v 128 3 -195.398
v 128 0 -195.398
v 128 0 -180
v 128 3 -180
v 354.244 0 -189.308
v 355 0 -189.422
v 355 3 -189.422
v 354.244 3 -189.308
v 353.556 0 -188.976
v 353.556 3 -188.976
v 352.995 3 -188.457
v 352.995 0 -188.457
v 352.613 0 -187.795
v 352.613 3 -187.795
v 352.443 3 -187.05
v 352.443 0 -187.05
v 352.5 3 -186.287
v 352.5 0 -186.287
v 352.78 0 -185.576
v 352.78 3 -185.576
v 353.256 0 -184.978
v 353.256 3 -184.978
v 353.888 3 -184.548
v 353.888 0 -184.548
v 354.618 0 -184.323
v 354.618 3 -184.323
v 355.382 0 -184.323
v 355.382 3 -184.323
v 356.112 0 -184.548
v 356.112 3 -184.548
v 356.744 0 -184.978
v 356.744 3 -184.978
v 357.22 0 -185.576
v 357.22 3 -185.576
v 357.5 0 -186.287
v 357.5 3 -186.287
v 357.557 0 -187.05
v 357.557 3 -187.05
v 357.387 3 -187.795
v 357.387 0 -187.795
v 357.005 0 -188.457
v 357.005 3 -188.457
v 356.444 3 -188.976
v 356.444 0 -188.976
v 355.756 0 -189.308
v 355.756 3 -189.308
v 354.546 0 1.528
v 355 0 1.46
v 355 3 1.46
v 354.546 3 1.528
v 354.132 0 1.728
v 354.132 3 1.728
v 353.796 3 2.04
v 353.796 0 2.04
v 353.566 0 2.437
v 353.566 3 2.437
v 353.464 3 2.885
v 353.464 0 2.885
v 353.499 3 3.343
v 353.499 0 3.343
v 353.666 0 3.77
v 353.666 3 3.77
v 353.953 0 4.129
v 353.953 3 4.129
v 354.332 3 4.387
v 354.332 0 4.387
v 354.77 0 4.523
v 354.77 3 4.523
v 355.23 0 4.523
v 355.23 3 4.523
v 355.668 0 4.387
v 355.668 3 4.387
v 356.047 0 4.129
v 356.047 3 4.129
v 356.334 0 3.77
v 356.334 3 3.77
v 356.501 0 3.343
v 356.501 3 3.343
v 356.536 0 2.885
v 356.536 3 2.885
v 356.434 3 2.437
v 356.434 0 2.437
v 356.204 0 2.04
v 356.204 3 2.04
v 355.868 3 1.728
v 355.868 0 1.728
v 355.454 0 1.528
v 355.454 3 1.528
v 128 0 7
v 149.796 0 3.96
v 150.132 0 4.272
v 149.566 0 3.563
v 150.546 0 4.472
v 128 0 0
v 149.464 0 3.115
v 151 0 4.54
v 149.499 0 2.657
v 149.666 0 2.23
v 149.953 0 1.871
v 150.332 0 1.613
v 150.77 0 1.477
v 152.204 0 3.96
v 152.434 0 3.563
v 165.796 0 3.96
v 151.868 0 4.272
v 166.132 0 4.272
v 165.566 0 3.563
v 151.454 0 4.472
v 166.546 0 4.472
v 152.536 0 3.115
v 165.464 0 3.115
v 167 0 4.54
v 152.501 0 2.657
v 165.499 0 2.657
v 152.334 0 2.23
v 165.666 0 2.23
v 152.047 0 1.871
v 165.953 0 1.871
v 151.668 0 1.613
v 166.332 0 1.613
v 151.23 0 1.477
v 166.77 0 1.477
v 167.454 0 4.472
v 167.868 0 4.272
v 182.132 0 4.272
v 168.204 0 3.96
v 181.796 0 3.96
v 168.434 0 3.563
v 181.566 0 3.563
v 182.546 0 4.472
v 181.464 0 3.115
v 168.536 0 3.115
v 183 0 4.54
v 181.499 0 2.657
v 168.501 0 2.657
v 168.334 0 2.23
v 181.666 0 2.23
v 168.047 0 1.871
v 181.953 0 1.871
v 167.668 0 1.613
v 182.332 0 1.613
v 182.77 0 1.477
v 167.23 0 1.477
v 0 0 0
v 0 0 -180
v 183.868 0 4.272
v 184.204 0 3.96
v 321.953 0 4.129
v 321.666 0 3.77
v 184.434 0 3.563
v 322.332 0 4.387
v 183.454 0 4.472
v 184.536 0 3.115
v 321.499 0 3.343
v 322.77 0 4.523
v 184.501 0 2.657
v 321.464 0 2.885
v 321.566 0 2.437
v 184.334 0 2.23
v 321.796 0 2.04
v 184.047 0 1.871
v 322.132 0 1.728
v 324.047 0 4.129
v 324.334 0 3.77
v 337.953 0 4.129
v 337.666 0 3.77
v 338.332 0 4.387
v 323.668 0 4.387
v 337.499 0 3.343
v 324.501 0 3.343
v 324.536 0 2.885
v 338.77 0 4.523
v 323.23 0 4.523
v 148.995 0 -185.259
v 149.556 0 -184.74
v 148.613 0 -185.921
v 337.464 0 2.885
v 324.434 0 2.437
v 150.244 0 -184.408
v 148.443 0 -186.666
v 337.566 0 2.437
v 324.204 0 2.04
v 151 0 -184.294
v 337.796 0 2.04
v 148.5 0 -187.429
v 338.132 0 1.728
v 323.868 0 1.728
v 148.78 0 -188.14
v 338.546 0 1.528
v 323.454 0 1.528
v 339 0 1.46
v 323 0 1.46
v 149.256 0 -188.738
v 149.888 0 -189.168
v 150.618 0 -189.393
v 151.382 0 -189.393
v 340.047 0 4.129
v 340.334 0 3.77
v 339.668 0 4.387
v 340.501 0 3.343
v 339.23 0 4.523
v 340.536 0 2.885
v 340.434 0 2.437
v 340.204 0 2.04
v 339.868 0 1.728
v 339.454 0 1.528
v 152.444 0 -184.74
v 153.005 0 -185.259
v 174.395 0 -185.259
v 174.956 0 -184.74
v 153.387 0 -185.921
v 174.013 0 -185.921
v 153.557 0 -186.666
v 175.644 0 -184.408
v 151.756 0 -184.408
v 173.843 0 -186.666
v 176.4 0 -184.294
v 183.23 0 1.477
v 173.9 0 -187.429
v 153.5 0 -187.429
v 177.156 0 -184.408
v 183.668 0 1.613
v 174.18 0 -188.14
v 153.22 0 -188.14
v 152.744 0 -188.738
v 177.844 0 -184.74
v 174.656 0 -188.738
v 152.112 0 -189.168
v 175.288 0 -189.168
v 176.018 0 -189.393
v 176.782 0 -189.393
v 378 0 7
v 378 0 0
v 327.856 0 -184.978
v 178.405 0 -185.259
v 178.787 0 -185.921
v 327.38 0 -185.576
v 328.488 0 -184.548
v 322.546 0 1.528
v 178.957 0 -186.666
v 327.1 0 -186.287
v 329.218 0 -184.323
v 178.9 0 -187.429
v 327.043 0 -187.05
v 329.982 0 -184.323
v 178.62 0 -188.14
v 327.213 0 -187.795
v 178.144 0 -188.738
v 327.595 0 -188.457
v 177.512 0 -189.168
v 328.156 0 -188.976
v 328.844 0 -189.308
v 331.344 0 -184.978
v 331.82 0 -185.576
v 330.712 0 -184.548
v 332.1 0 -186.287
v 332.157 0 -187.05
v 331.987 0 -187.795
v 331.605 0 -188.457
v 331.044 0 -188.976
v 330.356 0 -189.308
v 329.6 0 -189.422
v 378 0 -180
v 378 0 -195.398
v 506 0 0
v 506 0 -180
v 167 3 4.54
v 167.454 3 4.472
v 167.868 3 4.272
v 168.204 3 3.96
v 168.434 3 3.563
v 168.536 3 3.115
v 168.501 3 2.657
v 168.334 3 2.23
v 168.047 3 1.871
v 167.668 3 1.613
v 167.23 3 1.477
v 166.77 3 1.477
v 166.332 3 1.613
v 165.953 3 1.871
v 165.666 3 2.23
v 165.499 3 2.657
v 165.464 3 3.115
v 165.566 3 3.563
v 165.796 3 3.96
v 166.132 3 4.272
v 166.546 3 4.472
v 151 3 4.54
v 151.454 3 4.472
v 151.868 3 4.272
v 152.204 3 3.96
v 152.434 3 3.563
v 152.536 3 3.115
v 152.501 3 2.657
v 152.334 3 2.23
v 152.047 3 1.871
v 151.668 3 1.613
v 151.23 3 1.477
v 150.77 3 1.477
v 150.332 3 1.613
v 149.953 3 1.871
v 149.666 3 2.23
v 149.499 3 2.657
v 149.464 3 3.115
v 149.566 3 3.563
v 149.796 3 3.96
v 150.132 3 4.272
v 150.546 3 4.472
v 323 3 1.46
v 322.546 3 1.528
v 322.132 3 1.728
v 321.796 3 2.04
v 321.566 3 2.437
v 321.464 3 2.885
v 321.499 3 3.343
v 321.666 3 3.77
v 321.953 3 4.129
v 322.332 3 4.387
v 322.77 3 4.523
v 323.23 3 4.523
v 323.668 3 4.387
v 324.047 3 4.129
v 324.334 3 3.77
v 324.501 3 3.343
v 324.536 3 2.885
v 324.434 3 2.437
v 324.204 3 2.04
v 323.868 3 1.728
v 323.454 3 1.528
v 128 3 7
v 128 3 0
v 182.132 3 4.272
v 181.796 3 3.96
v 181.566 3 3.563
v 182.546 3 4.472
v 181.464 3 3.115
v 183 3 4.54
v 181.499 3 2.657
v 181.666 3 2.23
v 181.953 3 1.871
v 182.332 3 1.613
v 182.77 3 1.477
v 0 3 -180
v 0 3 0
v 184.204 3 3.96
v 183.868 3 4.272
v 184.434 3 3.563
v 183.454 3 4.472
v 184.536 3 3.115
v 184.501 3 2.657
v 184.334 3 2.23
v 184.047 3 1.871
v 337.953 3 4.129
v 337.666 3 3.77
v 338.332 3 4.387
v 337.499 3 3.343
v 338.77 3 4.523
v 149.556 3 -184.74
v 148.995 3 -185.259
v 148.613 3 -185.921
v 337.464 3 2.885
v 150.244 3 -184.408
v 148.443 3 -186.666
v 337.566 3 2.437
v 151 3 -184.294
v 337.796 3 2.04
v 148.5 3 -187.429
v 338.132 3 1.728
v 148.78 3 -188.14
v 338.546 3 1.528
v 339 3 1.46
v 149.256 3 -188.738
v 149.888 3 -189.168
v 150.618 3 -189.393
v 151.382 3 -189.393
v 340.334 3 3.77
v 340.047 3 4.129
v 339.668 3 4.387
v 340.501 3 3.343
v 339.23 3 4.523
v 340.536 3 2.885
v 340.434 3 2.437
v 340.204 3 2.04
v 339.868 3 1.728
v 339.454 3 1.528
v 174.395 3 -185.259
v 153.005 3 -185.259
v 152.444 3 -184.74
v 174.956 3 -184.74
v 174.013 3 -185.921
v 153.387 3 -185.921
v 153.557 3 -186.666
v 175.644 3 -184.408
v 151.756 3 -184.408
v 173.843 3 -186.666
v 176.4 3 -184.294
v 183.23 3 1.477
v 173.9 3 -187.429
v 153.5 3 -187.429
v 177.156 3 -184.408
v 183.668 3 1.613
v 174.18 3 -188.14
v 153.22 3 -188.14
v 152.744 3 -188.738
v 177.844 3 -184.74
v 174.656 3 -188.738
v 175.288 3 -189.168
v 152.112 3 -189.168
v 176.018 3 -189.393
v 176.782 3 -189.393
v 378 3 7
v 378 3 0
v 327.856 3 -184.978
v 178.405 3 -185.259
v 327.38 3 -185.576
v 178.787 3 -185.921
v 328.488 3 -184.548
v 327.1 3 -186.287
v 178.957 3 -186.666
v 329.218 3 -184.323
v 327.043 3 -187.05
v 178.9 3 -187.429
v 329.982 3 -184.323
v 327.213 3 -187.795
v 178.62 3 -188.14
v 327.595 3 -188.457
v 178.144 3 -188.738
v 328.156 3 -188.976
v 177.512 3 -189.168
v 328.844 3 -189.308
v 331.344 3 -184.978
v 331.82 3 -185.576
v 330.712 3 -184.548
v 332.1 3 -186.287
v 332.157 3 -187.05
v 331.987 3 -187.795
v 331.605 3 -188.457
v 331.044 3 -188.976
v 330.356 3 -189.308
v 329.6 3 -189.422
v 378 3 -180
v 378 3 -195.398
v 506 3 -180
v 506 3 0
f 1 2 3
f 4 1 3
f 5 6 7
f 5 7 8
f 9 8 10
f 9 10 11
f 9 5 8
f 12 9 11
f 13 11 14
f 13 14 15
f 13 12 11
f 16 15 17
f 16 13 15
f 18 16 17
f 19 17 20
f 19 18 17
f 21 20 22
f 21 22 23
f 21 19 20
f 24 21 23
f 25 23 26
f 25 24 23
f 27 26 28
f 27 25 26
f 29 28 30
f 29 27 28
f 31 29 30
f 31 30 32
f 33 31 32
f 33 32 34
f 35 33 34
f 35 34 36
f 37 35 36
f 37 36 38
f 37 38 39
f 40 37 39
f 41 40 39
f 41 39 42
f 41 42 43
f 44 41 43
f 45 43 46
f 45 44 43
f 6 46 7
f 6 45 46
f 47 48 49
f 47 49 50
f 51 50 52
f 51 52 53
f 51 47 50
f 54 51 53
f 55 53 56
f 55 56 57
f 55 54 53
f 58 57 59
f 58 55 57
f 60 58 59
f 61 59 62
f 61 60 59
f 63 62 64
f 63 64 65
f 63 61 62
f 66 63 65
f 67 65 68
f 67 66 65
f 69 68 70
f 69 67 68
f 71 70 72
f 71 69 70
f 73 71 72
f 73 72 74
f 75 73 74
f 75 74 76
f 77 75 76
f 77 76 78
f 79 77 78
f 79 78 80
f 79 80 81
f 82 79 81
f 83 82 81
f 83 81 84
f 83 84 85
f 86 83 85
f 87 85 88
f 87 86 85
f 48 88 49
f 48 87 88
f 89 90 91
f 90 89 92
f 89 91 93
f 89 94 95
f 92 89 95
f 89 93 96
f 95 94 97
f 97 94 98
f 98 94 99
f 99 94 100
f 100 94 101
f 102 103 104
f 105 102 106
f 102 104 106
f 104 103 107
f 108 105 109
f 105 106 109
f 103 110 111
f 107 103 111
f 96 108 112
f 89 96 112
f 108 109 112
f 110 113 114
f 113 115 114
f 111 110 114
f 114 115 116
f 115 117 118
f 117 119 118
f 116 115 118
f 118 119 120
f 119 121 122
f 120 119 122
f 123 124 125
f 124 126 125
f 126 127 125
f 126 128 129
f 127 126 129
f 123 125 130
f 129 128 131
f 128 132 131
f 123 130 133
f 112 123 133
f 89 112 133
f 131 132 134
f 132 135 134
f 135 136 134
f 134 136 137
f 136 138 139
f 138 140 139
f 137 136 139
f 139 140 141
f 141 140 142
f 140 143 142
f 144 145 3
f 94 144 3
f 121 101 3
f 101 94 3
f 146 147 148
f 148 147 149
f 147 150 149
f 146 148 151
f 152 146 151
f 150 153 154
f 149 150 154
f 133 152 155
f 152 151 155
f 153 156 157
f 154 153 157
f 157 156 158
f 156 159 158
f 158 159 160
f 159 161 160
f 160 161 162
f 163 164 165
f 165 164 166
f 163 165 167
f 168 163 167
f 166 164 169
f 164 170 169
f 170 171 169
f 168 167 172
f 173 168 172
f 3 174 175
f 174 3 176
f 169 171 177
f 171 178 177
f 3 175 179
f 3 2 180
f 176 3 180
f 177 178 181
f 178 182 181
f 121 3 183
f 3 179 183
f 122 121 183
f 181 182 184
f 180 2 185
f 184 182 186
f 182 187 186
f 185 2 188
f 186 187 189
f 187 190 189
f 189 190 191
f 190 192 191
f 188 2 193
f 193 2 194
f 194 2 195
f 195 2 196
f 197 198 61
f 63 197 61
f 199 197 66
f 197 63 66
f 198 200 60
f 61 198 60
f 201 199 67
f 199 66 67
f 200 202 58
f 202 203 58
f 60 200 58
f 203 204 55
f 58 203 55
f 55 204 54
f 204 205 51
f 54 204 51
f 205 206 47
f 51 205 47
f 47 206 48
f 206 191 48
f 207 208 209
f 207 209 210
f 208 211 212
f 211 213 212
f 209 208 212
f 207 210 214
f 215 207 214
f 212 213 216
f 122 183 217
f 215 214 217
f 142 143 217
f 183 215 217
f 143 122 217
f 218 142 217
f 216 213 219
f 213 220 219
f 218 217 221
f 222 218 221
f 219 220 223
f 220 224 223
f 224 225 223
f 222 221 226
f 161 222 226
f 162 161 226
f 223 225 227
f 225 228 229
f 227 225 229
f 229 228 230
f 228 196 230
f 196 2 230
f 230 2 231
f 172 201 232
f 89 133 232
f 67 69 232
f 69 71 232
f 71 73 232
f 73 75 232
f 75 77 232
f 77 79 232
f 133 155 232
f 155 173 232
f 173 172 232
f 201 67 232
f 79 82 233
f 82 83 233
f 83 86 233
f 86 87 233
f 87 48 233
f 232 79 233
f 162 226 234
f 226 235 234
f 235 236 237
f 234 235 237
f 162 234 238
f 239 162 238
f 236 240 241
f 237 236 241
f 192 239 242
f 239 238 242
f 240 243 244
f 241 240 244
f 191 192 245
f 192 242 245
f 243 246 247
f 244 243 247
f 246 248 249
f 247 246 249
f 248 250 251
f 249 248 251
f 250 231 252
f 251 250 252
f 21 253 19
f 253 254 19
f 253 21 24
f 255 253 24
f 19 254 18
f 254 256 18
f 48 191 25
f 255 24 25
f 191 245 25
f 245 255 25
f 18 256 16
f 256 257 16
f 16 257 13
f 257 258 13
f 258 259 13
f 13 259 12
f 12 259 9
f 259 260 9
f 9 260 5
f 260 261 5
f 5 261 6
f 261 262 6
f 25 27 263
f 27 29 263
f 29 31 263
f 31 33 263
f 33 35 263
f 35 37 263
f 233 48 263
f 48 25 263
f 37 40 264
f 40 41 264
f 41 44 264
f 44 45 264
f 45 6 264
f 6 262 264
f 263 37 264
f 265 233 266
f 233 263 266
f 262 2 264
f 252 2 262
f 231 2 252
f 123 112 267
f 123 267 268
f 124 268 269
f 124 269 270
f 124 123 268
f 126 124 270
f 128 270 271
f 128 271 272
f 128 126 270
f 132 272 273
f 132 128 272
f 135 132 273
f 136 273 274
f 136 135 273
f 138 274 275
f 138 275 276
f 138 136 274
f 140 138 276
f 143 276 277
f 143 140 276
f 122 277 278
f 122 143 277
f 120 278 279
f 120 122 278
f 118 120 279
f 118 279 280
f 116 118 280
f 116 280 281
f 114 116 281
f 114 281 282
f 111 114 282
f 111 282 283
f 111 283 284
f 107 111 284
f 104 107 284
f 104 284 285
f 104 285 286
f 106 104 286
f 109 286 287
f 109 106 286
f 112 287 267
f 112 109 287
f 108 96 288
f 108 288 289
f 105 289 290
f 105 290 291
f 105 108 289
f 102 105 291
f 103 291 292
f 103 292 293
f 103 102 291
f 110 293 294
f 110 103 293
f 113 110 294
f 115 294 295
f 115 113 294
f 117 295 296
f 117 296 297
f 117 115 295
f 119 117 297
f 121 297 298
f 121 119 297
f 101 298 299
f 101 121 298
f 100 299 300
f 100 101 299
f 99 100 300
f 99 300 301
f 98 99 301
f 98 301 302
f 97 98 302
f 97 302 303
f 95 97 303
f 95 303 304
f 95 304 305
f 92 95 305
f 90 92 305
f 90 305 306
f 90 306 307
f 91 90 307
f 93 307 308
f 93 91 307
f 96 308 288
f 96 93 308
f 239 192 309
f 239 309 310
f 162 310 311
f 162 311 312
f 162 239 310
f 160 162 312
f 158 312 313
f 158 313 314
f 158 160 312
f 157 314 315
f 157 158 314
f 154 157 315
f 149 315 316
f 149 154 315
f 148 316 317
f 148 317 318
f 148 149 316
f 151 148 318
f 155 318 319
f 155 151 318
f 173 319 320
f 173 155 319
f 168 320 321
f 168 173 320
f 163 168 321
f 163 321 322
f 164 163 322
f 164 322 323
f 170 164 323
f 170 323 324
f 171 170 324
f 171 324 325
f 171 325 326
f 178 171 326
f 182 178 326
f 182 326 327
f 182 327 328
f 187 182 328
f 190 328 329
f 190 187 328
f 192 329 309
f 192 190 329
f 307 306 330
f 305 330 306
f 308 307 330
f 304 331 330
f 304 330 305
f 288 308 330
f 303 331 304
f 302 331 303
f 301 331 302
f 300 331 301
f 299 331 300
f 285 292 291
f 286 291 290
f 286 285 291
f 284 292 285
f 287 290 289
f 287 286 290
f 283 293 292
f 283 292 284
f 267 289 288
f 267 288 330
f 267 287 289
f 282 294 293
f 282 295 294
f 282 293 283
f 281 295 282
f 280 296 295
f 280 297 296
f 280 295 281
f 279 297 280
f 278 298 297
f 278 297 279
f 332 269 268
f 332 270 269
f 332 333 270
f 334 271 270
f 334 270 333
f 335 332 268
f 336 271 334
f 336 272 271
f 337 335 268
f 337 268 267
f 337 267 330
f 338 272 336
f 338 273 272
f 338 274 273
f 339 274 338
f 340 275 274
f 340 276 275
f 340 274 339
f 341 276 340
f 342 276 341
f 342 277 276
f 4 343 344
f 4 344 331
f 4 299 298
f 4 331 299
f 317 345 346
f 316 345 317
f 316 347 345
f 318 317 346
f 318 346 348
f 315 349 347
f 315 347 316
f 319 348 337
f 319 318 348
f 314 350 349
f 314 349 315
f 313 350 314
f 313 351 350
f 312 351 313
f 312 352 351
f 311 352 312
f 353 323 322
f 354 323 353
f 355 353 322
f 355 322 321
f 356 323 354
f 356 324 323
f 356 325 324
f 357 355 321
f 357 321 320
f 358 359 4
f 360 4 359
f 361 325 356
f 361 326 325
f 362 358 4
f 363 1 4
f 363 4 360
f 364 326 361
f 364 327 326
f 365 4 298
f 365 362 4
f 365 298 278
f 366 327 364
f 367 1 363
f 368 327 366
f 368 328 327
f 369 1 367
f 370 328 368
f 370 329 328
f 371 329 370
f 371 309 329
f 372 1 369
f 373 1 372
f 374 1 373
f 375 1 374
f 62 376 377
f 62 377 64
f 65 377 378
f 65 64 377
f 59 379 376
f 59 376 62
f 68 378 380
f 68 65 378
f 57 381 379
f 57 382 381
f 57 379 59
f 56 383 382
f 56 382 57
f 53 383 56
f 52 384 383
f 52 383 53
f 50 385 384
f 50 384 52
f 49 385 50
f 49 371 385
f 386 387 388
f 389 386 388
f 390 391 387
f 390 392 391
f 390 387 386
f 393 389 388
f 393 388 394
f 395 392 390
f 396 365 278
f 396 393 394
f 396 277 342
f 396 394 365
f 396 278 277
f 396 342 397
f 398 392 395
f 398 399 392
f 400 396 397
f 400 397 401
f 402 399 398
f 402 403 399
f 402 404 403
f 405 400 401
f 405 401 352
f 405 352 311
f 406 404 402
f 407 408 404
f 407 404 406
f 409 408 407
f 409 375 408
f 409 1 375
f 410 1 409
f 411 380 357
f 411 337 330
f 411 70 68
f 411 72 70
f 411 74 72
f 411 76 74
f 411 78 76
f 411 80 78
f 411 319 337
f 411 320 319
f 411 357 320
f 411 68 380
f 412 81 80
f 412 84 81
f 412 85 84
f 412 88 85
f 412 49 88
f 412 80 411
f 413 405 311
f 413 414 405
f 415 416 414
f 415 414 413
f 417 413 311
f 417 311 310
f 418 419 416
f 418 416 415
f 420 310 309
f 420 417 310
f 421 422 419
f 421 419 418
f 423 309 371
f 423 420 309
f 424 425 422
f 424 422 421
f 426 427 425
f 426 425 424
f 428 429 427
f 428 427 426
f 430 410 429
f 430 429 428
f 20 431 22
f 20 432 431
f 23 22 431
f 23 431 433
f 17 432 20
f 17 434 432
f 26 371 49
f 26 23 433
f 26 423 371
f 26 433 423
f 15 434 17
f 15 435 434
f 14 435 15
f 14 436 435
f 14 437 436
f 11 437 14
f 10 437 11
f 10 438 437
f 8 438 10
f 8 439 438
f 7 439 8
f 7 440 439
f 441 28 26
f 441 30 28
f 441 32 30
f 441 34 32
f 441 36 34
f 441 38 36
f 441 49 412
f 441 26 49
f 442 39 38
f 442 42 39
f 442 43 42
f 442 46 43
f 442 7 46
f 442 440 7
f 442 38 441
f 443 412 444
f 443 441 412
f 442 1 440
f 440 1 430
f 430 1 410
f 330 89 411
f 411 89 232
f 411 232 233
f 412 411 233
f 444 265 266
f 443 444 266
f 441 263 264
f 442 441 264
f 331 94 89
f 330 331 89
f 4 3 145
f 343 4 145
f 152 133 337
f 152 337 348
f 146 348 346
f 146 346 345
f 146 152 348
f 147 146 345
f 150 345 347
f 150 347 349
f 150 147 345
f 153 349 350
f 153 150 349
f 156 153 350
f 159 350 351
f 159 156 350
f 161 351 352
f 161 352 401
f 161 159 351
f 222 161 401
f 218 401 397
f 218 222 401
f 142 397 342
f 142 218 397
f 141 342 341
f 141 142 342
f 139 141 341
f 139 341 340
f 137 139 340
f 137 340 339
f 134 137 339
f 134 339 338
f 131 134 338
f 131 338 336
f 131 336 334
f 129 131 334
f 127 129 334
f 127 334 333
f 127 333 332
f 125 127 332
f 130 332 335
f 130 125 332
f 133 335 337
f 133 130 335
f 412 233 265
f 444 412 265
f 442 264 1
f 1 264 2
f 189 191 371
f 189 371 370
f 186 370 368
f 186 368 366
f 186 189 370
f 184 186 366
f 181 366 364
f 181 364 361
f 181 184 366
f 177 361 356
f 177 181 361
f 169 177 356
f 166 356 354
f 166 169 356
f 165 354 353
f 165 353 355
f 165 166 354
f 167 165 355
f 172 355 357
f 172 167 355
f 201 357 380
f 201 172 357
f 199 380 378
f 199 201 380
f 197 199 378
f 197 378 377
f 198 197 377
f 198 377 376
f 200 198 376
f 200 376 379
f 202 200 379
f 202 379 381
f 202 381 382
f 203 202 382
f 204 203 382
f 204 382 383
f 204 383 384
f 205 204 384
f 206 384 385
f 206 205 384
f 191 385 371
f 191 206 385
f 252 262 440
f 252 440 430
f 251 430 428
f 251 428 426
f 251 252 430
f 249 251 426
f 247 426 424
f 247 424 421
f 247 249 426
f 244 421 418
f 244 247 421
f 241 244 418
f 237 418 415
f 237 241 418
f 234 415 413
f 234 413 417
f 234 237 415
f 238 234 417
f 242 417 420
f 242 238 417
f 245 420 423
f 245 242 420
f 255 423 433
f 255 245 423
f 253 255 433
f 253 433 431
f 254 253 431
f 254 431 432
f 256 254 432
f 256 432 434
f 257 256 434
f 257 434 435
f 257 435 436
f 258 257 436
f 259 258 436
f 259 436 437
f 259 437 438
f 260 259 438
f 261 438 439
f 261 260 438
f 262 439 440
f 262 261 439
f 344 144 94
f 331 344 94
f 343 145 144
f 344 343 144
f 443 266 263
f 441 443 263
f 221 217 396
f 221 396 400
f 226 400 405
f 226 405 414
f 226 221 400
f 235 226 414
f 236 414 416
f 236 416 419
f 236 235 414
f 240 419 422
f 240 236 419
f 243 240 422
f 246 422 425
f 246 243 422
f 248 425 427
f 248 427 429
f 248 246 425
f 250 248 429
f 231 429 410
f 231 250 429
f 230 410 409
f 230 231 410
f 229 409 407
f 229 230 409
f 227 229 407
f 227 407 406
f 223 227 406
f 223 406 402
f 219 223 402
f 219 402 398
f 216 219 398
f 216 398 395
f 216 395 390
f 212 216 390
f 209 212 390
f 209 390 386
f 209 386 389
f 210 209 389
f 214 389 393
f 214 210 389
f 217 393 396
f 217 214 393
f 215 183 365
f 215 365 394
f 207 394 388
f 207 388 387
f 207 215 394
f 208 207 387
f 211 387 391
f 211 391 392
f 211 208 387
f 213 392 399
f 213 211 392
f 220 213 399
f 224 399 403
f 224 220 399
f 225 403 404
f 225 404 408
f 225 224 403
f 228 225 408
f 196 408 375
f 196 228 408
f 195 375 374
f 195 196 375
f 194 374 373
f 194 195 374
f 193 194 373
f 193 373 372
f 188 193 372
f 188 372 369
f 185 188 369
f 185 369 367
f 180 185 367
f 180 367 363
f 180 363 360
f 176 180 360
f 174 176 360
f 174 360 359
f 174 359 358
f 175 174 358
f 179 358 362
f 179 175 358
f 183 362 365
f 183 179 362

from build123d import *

# Parameters (mm, degrees)
SKETCH1_R           = 2.564
SKETCH1_R_2         = 1.54
BOSS_EXTRUDE1_DEPTH = 3


with BuildPart() as part:
    # Sketch1 → Boss-Extrude1 (new body)
    with BuildSketch(Plane(origin=(0, 0, 0), x_dir=(1, 0, 0), z_dir=(0, 1, 0))):
        Polygon((128, 0), (128, -7), (378, -7), (378, 0), (506, 0), (506, 180), (378, 180), (378, 195.398), (128, 195.398), (128, 180), (0, 180), (0, 0), align=None)
        with Locations(Location((151, 186.858, 0), (0, 0, 270))):
            Circle(SKETCH1_R, mode=Mode.SUBTRACT)
        with Locations(Location((176.4, 186.858, 0), (0, 0, 270))):
            Circle(SKETCH1_R, mode=Mode.SUBTRACT)
        with Locations(Location((151, -3, 0), (0, 0, 270))):
            Circle(SKETCH1_R_2, mode=Mode.SUBTRACT)
        with Locations(Location((183, -3, 0), (0, 0, 270))):
            Circle(SKETCH1_R_2, mode=Mode.SUBTRACT)
        with Locations(Location((329.6, 186.858, 0), (0, 0, 90))):
            Circle(SKETCH1_R, mode=Mode.SUBTRACT)
        with Locations(Location((355, 186.858, 0), (0, 0, 90))):
            Circle(SKETCH1_R, mode=Mode.SUBTRACT)
        with Locations(Location((167, -3, 0), (0, 0, 270))):
            Circle(SKETCH1_R_2, mode=Mode.SUBTRACT)
        with Locations(Location((323, -3, 0), (0, 0, 90))):
            Circle(SKETCH1_R_2, mode=Mode.SUBTRACT)
        with Locations(Location((339, -3, 0), (0, 0, 90))):
            Circle(SKETCH1_R_2, mode=Mode.SUBTRACT)
        with Locations(Location((355, -3, 0), (0, 0, 90))):
            Circle(SKETCH1_R_2, mode=Mode.SUBTRACT)
    extrude(amount=BOSS_EXTRUDE1_DEPTH)


solid = part.part
